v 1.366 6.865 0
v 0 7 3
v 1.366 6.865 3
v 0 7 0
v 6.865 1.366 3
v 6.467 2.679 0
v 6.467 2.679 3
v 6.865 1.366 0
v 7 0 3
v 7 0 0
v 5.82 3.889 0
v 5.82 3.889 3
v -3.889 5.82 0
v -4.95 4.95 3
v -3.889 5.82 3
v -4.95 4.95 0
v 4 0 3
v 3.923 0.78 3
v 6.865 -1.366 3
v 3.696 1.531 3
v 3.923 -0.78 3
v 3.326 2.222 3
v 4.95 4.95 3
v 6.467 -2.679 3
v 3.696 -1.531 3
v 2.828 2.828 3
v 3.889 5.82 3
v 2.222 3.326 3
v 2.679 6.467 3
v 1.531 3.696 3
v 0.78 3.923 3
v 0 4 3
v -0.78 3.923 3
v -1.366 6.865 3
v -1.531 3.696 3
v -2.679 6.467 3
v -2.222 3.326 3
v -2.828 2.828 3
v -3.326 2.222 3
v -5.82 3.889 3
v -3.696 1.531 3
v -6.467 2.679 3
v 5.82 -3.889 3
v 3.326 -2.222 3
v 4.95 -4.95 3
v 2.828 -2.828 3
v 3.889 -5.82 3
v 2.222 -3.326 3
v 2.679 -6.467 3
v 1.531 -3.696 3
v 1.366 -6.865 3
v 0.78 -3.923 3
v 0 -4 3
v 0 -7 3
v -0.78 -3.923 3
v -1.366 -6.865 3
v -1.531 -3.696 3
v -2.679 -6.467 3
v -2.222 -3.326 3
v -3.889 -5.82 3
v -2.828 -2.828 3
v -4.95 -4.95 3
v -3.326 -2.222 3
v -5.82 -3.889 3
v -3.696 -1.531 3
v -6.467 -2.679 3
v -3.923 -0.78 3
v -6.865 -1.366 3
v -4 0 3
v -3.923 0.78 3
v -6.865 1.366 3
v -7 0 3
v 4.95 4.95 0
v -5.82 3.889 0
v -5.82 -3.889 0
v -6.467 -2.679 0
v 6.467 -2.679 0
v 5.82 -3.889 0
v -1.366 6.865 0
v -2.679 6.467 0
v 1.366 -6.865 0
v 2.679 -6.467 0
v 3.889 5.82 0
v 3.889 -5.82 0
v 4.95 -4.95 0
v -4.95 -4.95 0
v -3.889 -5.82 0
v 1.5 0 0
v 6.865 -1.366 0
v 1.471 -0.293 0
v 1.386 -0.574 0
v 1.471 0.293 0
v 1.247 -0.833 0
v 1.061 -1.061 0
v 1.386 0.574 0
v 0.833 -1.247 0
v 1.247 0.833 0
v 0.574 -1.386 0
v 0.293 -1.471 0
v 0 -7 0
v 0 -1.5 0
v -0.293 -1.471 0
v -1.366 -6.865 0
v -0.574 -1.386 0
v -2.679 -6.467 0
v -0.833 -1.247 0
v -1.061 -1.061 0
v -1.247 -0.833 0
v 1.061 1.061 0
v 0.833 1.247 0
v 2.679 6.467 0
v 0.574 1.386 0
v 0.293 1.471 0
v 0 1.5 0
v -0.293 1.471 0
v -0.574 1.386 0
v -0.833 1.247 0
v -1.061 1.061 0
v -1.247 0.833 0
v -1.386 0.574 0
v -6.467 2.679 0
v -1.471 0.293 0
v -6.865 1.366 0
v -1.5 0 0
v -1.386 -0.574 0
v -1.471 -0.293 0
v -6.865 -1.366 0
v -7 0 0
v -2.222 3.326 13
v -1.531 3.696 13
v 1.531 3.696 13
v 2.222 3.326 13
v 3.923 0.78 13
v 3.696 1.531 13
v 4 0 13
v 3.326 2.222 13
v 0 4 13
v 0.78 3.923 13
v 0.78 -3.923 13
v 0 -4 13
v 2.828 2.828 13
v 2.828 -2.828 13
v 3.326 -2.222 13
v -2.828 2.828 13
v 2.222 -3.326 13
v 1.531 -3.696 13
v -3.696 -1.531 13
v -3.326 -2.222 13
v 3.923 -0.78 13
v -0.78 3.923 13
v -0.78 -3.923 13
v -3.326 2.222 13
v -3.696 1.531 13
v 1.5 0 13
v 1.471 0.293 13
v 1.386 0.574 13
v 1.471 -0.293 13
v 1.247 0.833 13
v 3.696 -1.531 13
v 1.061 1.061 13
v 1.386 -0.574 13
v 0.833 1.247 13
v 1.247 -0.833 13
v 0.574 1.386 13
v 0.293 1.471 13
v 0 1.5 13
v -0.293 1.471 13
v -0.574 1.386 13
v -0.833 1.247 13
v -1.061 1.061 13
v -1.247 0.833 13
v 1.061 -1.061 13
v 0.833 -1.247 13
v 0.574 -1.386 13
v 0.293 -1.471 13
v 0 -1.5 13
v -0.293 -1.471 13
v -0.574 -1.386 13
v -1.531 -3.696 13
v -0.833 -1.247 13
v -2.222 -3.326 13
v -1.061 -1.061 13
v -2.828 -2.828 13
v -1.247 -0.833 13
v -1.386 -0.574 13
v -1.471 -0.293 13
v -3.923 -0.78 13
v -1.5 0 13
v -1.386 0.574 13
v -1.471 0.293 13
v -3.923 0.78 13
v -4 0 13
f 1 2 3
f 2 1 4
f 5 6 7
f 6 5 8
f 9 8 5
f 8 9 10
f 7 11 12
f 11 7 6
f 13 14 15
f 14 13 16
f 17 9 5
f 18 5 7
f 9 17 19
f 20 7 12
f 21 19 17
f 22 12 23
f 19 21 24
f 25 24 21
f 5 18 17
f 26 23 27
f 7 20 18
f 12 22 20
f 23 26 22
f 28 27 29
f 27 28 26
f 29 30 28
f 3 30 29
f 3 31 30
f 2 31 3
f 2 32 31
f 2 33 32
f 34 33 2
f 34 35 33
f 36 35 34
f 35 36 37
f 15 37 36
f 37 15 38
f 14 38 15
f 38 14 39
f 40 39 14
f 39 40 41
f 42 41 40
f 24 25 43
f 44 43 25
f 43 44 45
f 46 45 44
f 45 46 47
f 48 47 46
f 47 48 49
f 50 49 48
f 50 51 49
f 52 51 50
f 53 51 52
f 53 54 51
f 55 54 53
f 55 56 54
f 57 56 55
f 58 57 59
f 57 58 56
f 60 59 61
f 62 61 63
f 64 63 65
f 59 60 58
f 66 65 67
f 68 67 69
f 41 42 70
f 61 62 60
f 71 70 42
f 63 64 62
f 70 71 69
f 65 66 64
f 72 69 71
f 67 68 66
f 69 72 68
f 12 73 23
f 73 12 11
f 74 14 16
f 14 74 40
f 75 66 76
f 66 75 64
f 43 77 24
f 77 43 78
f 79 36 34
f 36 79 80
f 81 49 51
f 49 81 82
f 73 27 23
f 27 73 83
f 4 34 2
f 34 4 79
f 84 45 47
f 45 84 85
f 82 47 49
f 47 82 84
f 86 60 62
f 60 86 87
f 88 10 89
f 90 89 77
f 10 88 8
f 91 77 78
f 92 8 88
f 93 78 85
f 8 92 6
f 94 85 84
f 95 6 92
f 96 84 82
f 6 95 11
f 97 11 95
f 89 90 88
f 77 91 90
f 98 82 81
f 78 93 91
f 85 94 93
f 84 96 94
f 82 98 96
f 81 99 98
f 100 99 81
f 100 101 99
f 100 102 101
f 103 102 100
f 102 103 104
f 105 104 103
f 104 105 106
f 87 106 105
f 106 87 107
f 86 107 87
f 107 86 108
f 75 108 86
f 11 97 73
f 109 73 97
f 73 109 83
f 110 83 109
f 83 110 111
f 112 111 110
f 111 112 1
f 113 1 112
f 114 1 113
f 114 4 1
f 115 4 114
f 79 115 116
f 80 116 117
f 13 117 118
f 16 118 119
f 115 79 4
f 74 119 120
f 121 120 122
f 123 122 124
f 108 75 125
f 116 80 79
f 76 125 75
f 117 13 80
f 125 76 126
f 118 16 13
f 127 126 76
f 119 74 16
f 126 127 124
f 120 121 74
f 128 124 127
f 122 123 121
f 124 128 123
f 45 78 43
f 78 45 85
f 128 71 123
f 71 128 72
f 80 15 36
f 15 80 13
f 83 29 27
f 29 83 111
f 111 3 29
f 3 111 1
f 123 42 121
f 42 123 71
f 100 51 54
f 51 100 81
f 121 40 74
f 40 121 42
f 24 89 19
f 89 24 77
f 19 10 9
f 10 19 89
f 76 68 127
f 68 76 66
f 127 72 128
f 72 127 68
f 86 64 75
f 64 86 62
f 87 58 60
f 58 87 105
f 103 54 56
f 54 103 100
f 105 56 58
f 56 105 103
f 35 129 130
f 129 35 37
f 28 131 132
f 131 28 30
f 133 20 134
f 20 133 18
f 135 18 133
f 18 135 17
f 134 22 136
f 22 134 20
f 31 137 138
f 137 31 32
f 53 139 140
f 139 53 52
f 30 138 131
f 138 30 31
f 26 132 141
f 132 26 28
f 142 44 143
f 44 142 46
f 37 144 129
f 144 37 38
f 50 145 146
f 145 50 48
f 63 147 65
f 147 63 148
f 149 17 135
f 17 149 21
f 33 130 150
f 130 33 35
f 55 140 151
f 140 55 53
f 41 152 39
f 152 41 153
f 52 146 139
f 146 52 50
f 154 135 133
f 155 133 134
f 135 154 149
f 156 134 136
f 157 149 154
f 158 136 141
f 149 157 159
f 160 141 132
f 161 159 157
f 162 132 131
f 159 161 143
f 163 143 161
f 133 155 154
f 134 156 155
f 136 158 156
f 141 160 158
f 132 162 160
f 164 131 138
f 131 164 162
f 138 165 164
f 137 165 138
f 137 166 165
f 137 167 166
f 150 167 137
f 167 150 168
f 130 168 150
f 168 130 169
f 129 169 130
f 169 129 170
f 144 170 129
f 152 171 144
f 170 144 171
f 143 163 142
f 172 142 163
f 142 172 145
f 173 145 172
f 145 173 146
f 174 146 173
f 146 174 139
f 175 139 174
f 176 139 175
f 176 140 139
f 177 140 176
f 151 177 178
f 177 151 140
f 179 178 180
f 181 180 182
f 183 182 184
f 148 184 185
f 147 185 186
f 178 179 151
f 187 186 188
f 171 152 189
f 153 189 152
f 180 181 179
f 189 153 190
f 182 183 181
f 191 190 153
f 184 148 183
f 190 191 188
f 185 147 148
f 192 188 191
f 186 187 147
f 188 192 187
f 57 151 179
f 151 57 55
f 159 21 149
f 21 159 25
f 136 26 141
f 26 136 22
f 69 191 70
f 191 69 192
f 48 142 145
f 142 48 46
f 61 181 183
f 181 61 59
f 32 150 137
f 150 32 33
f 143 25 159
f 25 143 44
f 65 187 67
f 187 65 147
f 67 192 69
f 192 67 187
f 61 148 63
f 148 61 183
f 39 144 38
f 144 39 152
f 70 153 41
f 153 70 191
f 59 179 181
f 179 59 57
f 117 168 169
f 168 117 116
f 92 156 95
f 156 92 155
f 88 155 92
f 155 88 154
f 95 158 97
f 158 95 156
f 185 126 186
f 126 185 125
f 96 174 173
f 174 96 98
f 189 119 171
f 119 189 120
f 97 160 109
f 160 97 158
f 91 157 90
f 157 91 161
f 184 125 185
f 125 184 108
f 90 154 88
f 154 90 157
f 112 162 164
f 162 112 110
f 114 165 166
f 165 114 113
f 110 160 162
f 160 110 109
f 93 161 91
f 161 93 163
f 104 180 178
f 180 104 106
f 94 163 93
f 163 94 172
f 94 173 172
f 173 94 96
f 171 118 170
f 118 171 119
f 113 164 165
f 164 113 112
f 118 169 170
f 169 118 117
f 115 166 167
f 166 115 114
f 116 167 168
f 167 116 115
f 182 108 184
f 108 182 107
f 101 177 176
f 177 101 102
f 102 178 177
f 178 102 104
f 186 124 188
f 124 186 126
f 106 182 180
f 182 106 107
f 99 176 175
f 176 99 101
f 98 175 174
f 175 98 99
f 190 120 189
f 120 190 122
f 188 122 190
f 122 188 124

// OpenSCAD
$fn = 32;

// ----------------------------------------------------------------------
// Micro post: flanged post, 5-20 mm class
// ----------------------------------------------------------------------

// --- parameters (mm) ---
post_d = 8;               // post diameter
post_h = 10;              // post height above the flange
flange_d = 14;            // flange diameter
flange_t = 3;             // flange thickness
bore_d = 3;               // through bore

total_h = post_h + flange_t;  // overall height

difference() {
  union() {
    cylinder(h = flange_t, d = flange_d);
    translate([0, 0, flange_t]) cylinder(h = post_h, d = post_d);
  }
  translate([0, 0, -1]) cylinder(h = total_h + 2, d = bore_d);
}
